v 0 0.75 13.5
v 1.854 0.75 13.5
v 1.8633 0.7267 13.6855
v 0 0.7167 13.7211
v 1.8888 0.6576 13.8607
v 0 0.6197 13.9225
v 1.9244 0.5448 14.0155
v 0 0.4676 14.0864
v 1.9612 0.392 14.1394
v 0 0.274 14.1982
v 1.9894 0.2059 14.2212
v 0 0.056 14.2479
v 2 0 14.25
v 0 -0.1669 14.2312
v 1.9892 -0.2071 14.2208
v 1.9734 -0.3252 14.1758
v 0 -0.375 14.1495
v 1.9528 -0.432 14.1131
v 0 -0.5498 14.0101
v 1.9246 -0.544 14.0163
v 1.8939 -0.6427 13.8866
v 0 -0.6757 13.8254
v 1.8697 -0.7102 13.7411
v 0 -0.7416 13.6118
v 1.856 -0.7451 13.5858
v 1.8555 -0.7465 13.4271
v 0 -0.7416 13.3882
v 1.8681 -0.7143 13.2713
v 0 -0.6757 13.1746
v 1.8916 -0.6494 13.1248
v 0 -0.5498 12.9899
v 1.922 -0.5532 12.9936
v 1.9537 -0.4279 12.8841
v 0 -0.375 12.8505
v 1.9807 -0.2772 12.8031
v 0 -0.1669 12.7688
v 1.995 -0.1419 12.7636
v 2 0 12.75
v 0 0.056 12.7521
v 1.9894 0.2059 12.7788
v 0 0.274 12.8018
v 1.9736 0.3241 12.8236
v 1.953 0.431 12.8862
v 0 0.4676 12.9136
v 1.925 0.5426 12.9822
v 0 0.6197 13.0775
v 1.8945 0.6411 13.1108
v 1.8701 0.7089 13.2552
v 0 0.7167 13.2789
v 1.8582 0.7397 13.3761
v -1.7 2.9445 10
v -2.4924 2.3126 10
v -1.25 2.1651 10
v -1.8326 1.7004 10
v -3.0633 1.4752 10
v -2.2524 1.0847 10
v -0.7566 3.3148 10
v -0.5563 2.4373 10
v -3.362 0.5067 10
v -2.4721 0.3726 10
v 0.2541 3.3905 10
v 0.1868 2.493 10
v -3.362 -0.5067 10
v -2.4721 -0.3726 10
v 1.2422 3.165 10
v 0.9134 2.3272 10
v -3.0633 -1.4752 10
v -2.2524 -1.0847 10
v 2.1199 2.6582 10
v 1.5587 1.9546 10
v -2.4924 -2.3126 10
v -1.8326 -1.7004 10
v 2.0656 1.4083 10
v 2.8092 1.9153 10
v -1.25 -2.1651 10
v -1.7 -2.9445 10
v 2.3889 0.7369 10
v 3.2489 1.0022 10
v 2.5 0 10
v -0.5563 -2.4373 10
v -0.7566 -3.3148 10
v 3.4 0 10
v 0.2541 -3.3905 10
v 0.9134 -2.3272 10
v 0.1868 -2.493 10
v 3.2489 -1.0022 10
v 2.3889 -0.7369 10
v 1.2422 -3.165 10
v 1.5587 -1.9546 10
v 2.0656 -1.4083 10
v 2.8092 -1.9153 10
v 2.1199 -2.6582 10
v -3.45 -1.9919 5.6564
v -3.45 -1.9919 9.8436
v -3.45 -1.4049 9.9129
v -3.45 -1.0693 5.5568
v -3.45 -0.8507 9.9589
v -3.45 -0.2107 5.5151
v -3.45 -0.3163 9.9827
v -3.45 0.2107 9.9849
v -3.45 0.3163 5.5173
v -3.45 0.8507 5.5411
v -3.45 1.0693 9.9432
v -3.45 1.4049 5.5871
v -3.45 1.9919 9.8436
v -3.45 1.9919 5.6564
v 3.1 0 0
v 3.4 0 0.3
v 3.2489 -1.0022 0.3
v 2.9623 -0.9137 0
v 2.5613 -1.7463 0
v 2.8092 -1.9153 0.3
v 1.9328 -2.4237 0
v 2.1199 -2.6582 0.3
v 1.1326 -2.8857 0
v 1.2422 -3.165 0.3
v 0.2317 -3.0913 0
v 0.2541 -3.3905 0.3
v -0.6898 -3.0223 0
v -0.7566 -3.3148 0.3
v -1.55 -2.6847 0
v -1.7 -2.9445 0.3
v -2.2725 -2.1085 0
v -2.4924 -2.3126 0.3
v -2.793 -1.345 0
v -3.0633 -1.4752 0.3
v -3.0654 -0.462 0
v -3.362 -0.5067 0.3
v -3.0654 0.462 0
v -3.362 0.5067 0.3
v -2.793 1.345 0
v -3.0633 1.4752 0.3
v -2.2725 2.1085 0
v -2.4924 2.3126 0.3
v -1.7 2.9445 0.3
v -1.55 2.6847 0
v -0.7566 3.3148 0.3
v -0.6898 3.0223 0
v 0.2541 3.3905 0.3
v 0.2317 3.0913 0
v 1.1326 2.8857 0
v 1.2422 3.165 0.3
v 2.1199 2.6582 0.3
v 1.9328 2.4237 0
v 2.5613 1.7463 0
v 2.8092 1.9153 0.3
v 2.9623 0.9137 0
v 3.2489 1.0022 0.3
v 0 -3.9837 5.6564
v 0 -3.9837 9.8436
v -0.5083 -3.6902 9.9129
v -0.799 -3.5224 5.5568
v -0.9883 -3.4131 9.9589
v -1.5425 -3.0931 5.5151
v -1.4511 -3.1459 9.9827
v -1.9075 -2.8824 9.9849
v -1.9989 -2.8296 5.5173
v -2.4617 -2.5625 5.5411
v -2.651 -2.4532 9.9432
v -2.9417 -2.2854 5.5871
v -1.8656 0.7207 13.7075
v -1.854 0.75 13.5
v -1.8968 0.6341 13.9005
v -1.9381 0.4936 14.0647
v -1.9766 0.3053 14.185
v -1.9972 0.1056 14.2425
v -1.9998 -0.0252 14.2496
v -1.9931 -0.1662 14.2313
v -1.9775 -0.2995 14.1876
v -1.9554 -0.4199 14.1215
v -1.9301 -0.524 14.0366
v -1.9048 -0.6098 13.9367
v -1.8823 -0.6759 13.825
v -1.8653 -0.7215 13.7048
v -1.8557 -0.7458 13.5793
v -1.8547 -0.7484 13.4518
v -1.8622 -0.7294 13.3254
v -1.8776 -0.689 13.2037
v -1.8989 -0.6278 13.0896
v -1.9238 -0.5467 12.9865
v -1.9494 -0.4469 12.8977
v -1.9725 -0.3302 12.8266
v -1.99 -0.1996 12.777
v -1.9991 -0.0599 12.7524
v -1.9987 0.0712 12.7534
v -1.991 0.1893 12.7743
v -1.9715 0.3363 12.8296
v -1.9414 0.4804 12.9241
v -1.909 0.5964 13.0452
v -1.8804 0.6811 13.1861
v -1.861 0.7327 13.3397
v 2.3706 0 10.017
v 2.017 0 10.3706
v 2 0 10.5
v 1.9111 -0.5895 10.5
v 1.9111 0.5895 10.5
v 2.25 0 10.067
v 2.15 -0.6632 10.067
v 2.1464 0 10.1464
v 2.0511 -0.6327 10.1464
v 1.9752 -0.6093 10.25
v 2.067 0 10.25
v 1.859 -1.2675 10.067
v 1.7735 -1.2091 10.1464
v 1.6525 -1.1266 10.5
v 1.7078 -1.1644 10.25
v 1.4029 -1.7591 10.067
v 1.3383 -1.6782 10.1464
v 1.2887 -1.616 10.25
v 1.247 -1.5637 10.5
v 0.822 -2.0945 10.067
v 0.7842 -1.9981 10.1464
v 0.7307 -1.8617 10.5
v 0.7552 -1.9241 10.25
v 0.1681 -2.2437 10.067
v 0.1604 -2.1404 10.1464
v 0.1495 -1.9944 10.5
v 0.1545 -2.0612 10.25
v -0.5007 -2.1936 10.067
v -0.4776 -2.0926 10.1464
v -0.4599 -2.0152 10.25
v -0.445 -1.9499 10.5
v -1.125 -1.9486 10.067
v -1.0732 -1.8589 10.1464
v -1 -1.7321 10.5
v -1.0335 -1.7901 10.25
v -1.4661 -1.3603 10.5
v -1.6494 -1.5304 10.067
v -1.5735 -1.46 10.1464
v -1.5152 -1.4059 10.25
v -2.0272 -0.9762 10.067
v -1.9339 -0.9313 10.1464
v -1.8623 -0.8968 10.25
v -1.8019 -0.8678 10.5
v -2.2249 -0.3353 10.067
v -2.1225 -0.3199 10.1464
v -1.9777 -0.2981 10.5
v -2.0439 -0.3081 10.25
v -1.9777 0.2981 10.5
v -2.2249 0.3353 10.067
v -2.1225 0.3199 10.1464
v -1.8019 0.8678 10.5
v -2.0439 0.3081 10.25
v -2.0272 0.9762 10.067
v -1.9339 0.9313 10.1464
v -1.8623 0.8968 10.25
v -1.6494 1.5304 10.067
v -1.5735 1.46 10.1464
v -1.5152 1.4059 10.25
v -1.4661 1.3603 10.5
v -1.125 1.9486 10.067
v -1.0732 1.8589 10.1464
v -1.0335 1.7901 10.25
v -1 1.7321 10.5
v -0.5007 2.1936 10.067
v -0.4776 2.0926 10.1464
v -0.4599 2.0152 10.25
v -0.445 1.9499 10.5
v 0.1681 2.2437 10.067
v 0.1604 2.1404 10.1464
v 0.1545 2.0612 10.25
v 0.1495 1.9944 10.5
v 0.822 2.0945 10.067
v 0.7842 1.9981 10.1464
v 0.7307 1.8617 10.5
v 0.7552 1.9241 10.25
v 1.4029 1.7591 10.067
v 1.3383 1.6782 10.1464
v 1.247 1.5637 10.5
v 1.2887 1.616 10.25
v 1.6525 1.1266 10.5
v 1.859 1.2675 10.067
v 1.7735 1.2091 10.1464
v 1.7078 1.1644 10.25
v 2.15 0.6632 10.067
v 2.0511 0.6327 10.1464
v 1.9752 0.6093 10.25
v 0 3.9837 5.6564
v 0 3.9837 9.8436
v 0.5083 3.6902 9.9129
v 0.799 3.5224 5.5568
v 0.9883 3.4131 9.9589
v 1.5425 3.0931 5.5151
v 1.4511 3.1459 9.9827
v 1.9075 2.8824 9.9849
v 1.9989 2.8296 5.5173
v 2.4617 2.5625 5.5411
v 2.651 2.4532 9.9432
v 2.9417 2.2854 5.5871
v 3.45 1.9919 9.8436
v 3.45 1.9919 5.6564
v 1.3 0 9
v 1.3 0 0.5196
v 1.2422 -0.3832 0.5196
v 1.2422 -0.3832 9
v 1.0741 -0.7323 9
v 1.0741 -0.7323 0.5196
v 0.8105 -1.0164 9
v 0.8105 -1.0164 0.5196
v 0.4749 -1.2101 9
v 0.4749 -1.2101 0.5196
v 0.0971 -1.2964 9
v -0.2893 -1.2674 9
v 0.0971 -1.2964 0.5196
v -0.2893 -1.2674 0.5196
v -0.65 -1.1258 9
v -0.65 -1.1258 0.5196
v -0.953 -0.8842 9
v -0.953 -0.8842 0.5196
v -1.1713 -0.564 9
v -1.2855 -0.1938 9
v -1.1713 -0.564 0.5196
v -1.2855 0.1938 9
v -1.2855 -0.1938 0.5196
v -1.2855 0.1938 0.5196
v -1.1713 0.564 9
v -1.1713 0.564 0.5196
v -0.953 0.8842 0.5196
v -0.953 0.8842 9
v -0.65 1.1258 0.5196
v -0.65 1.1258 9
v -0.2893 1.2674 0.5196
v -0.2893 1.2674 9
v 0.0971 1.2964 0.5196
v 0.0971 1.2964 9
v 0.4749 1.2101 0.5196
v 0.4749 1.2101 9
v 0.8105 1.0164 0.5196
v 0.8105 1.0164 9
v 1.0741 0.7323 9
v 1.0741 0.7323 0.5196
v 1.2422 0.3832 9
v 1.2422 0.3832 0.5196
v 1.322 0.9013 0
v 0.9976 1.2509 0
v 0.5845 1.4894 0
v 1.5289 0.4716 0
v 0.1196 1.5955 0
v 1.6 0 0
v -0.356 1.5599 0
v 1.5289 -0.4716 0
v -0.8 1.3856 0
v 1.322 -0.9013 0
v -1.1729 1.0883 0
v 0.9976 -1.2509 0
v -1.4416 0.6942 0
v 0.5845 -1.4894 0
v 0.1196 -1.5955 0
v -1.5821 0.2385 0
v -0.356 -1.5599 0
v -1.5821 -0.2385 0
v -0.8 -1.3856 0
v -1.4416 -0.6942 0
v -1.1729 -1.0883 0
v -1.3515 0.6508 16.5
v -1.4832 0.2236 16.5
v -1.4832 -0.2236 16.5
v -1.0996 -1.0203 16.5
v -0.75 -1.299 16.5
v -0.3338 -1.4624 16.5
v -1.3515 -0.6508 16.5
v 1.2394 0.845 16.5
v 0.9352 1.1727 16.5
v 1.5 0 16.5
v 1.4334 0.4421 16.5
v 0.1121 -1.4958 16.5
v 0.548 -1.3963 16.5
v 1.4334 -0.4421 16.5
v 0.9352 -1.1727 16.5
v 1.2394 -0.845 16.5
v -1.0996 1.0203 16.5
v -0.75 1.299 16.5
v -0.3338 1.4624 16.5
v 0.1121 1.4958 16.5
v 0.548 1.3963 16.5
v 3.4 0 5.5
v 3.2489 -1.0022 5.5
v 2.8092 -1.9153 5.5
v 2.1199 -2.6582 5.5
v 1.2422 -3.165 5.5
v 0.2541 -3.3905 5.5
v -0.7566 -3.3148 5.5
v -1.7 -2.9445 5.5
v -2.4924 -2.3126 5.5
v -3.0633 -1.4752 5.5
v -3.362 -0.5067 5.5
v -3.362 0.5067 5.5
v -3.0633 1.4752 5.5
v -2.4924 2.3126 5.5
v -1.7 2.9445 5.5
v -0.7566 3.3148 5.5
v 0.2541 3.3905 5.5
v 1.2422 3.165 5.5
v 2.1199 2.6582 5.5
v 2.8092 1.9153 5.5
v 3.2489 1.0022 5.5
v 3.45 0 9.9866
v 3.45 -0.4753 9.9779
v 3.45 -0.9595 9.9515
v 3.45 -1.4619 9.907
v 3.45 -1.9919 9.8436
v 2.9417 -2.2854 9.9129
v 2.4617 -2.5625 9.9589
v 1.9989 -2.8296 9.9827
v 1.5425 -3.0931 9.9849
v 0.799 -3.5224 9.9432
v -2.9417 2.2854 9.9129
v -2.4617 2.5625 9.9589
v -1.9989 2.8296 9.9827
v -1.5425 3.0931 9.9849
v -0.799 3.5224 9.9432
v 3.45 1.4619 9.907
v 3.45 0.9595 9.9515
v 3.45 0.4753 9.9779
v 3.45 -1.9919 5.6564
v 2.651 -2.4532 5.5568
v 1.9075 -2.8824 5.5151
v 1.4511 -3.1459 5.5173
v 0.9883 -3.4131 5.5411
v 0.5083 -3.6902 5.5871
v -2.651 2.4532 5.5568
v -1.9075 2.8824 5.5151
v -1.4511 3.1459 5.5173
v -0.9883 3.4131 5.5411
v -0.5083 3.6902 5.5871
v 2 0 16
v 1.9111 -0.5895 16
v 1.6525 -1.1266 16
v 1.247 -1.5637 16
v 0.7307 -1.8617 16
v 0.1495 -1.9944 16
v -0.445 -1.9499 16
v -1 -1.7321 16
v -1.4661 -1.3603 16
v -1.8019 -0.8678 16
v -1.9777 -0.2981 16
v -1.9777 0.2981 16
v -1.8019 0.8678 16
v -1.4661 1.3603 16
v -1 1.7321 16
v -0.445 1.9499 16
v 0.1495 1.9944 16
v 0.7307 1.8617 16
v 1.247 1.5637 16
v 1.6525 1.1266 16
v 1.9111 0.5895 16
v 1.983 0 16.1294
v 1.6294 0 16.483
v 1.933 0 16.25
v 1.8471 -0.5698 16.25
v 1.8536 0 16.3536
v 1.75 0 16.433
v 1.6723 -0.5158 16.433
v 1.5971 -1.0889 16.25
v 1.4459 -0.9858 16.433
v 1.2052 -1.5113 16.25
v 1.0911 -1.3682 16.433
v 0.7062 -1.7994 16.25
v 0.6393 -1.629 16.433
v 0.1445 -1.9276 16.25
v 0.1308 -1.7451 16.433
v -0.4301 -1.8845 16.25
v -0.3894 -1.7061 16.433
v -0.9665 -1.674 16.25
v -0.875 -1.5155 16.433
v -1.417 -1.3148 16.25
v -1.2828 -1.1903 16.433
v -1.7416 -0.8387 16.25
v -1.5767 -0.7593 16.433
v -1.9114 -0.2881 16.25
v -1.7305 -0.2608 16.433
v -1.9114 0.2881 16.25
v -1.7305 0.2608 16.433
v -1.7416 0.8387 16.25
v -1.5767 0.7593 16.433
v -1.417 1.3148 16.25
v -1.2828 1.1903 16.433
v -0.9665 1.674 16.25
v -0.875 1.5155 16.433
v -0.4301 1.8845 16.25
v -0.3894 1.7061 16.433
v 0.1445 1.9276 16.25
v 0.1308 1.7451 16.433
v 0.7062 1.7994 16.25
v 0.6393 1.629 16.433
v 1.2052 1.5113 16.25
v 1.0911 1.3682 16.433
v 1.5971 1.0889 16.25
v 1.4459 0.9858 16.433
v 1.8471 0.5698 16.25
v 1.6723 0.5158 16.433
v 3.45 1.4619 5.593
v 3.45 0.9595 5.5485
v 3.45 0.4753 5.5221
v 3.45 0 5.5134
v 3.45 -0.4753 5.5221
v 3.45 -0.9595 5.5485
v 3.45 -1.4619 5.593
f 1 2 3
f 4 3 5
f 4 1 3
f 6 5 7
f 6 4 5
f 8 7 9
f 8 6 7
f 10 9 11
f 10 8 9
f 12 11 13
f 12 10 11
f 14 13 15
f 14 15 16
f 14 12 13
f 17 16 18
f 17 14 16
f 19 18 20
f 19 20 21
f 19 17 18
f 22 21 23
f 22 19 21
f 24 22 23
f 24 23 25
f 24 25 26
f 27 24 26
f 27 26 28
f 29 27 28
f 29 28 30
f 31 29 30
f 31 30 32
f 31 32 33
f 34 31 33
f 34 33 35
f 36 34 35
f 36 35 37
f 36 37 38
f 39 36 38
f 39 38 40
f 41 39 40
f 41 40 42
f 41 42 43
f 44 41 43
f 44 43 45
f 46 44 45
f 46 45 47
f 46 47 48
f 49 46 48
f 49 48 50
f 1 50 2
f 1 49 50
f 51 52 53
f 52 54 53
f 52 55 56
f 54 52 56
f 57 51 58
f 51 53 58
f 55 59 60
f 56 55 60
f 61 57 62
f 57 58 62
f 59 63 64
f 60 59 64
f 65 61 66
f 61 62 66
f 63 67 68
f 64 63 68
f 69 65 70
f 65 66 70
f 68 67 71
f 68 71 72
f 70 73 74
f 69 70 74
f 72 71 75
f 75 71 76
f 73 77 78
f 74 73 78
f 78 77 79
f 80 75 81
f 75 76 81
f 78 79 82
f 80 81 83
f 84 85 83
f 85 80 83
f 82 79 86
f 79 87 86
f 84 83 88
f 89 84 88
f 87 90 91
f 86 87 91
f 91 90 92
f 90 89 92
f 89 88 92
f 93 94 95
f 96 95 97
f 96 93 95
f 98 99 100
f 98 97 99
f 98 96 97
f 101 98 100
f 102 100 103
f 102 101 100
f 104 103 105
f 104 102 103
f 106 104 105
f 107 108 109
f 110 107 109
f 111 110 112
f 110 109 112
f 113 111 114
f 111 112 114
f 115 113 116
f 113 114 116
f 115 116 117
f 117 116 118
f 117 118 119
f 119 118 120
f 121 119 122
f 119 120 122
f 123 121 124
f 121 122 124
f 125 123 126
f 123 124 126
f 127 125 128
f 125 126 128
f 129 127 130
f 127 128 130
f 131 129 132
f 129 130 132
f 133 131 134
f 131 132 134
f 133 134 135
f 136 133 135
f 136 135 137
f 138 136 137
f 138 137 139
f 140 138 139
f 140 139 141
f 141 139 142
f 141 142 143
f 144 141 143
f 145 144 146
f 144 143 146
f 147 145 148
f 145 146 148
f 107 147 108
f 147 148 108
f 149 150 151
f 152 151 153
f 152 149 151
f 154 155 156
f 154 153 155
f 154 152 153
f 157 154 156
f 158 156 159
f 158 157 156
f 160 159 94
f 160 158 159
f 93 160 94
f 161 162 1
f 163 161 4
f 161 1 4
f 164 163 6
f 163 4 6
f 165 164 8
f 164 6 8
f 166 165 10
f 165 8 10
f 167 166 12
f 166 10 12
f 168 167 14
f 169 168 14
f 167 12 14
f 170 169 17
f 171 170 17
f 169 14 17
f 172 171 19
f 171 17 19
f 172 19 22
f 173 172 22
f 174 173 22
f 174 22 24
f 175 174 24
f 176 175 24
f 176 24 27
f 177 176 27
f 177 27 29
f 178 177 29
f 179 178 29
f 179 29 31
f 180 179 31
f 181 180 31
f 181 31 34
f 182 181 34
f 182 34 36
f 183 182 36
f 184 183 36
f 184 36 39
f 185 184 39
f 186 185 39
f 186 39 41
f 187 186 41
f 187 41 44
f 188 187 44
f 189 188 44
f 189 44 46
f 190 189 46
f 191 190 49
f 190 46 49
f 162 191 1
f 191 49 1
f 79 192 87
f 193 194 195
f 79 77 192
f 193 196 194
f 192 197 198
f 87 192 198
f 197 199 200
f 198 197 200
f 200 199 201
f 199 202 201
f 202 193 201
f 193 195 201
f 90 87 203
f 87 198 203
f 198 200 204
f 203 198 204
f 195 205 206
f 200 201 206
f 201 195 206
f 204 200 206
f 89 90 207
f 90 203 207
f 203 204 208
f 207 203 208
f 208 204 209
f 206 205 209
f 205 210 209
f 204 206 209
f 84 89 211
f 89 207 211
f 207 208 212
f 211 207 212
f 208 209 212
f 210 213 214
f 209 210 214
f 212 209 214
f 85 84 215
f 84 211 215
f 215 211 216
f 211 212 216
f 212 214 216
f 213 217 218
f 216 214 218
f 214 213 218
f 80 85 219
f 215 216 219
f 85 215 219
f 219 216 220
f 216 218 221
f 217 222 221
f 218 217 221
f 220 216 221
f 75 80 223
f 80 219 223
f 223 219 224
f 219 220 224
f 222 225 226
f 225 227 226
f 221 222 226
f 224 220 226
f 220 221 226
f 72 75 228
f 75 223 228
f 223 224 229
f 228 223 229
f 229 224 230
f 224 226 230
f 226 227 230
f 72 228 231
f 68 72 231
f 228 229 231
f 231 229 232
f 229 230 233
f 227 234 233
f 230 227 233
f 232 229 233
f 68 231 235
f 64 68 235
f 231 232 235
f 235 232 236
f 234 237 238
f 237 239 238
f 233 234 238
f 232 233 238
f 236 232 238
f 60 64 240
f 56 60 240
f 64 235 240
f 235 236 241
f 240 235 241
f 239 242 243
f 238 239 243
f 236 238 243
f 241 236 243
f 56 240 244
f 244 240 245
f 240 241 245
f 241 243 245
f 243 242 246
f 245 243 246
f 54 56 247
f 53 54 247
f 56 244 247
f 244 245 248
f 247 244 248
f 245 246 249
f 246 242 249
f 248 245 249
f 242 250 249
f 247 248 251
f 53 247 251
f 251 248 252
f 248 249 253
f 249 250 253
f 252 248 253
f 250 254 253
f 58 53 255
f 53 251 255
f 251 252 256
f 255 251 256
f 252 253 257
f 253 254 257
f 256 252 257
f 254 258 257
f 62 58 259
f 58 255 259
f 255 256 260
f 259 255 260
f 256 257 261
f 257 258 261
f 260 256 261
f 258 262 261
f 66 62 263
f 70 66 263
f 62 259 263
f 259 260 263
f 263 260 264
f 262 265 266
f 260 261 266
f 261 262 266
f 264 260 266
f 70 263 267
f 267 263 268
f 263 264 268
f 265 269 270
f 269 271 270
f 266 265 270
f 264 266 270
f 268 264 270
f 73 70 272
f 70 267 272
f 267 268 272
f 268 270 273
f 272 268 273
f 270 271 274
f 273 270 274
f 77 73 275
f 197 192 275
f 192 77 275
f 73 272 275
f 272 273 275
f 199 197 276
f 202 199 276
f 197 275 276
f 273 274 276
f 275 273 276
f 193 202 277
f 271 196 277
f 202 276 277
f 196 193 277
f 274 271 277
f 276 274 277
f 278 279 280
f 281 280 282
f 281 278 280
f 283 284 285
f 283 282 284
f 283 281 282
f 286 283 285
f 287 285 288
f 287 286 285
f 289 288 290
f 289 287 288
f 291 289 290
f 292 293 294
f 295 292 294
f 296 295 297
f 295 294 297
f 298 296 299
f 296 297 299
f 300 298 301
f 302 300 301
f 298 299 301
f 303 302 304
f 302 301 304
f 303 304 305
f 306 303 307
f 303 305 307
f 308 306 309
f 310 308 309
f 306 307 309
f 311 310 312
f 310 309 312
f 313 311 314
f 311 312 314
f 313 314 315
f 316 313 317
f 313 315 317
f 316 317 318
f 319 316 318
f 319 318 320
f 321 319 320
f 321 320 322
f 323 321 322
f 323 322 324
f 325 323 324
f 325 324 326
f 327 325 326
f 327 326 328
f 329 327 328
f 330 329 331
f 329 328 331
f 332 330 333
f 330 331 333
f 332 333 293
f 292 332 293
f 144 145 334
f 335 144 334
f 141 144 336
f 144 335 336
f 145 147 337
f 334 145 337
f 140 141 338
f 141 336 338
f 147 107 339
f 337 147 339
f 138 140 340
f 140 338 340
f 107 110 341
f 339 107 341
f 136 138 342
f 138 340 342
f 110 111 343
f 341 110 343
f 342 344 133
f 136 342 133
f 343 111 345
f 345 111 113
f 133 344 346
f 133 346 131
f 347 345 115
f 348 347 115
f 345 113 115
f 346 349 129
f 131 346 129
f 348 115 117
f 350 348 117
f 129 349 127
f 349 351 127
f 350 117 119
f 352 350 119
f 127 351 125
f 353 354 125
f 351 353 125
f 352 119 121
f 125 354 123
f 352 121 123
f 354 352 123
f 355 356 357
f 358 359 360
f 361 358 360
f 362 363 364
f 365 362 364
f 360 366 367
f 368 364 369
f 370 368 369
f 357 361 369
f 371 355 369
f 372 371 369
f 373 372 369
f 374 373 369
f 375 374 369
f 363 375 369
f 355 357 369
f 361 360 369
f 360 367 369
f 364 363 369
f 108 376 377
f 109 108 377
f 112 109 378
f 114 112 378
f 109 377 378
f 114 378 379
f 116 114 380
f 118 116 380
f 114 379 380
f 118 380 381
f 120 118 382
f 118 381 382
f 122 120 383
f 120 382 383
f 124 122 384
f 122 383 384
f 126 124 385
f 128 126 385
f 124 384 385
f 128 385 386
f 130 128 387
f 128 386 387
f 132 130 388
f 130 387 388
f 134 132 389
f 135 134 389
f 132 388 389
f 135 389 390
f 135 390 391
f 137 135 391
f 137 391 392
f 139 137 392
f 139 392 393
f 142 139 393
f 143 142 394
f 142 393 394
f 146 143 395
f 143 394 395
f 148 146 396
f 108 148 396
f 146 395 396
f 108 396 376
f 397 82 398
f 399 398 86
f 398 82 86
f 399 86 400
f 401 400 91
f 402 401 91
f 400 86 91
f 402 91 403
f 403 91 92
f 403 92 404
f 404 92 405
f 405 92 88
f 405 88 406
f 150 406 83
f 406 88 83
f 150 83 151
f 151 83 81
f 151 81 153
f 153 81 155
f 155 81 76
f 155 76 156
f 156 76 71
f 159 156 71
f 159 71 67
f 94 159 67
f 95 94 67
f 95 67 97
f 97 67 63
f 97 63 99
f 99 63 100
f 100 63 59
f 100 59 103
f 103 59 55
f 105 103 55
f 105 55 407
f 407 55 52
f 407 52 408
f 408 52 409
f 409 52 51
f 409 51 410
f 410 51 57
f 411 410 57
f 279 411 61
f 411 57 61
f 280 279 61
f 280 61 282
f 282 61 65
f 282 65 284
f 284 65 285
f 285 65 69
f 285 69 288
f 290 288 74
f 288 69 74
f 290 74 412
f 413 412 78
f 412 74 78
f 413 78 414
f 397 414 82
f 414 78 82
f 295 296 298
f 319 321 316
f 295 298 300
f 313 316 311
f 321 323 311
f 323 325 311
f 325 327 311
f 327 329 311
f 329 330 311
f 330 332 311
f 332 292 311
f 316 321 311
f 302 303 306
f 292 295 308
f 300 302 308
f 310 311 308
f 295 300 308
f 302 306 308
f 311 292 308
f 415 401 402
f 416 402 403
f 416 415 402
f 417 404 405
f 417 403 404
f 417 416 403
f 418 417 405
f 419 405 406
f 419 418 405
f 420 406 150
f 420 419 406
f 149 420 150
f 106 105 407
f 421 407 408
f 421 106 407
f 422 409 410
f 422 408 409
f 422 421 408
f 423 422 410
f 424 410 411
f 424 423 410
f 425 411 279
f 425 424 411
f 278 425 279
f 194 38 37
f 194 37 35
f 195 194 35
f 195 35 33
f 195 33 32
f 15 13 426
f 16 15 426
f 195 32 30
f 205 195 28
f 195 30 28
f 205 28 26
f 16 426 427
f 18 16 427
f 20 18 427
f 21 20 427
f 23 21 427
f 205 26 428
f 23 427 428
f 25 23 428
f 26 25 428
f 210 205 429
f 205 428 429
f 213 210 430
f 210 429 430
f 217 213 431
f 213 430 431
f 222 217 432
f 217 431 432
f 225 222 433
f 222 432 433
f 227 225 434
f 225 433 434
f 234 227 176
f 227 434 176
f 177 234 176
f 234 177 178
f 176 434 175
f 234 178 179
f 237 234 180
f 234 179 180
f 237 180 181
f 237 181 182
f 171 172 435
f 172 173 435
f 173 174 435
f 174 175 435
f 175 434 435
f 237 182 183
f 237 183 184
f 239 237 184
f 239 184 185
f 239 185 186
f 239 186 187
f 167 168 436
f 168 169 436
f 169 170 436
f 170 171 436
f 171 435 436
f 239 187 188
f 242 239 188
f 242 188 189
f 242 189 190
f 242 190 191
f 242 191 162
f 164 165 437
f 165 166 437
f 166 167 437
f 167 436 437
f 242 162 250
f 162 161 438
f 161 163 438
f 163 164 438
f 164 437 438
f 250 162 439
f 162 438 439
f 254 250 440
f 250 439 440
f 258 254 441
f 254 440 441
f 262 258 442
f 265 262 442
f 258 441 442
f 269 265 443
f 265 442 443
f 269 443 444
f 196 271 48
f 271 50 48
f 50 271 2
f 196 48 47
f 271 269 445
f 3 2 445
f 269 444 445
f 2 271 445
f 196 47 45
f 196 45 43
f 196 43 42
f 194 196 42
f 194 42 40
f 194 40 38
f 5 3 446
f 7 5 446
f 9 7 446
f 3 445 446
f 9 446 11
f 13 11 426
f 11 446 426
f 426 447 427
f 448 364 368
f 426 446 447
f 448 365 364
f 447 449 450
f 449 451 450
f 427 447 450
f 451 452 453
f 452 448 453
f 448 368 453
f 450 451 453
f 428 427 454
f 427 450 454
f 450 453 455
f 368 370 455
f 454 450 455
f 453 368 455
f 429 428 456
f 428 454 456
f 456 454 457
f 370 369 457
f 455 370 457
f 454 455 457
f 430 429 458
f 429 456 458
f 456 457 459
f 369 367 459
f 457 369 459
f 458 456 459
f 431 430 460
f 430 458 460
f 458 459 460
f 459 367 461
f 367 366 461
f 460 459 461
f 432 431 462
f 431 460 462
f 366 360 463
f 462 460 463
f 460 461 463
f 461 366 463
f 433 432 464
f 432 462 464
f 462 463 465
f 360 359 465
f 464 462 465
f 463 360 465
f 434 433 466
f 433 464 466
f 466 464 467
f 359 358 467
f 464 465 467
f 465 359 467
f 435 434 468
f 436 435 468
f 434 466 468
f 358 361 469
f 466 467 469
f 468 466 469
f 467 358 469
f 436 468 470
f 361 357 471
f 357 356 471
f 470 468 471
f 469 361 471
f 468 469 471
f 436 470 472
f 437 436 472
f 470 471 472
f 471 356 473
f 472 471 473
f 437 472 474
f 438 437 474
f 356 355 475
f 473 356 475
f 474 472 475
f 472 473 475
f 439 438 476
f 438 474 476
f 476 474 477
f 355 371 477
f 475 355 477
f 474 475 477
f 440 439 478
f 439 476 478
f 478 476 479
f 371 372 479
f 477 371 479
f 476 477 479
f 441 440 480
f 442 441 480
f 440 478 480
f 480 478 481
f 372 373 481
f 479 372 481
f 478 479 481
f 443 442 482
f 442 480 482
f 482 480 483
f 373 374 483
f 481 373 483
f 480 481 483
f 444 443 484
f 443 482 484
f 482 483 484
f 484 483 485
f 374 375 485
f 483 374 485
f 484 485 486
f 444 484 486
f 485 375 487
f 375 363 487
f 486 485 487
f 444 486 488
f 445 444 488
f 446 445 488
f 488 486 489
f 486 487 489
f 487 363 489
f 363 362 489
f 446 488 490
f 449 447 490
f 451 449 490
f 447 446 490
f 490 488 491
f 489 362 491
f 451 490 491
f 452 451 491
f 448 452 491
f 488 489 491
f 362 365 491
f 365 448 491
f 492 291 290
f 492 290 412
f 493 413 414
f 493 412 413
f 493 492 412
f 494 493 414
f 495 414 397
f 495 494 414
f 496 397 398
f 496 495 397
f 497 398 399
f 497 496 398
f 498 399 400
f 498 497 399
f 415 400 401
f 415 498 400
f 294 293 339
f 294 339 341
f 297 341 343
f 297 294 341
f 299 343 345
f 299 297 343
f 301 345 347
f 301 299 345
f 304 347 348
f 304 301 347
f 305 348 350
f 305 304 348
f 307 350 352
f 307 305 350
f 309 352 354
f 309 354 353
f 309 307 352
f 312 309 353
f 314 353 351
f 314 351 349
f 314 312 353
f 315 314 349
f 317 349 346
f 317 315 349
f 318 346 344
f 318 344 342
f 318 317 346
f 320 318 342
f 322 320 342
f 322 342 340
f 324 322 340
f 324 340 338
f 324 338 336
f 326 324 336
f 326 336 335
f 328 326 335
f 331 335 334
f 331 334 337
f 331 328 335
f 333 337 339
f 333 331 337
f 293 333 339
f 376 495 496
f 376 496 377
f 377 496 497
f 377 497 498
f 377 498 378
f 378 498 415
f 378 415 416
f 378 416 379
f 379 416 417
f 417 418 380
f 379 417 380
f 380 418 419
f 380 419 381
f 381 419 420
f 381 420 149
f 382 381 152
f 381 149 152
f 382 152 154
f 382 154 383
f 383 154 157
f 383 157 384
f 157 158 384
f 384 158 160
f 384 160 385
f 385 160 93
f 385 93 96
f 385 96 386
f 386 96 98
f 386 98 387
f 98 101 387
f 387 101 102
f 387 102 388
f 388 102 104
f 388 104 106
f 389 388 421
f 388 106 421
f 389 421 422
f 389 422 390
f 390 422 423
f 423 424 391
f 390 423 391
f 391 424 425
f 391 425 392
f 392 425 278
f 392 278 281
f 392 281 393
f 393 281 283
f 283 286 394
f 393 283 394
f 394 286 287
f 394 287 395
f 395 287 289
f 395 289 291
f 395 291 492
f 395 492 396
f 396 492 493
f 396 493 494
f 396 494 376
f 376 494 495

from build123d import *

# Parameters (mm, degrees)
F2_R          = 5.941705
F3_DEPTH      = 16.501
F4_R          = 0.75
F5_DEPTH      = 3.451
F5_DEPTH_BACK = 3.451
F6_SIZE       = 0.3
F7_SIZE2      = 0.519615
F7_SIZE       = 0.3


with BuildPart() as f1:
    # F0 (on Front) → F1 (revolve)
    with BuildSketch(Plane.XZ):
        with BuildLine():
            Line((1.3, 9), (1.3, 0))
            Line((1.3, 0), (3.4, 0))
            Line((3.4, 0), (3.4, 5.5))
            Line((3.4, 5.5), (4, 5.66077))
            Line((4, 5.66077), (4, 9.83923))
            Line((4, 9.83923), (3.4, 10))
            Line((3.4, 10), (2.5, 10))
            ThreePointArc((2.5, 10), (2.146447, 10.146447), (2, 10.5))
            Line((2, 10.5), (2, 16))
            ThreePointArc((2, 16), (1.853553, 16.353553), (1.5, 16.5))
            Line((1.5, 16.5), (0, 16.5))
            Line((0, 16.5), (0, 9))
            Line((0, 9), (1.3, 9))
        make_face()
    revolve(axis=Axis((0, 0, 7.769906), (0, 0, -1)))

    # F2 (on Top) → F3 (cut, through all)
    with BuildSketch(Plane.XY):
        with Locations((0, -0.622483)):
            Circle(F2_R)
        Polygon((0, 3.983717), (3.45, 1.991858), (3.45, -1.991858), (0, -3.983717), (-3.45, -1.991858), (-3.45, 1.991858), align=None, mode=Mode.SUBTRACT)
    extrude(amount=F3_DEPTH, mode=Mode.SUBTRACT)

    # F4 (on Right) → F5 (cut, two sides)
    with BuildSketch(Plane.YZ) as f5_sk:
        with Locations((0, 13.5)):
            Circle(F4_R)
    extrude(amount=F5_DEPTH, mode=Mode.SUBTRACT)
    extrude(f5_sk.sketch, amount=-F5_DEPTH_BACK, mode=Mode.SUBTRACT)

    # F6
    f6_edges = [f1.edges().sort_by_distance(p)[0] for p in [
        (-3.4, 0, 0),
    ]]
    chamfer(f6_edges, length=F6_SIZE)

    # F7
    f7_edges = [f1.edges().sort_by_distance(p)[0] for p in [
        (-1.3, 0, 0),
    ]]
    chamfer(f7_edges, length=F7_SIZE, length2=F7_SIZE2)


solid = f1.part
